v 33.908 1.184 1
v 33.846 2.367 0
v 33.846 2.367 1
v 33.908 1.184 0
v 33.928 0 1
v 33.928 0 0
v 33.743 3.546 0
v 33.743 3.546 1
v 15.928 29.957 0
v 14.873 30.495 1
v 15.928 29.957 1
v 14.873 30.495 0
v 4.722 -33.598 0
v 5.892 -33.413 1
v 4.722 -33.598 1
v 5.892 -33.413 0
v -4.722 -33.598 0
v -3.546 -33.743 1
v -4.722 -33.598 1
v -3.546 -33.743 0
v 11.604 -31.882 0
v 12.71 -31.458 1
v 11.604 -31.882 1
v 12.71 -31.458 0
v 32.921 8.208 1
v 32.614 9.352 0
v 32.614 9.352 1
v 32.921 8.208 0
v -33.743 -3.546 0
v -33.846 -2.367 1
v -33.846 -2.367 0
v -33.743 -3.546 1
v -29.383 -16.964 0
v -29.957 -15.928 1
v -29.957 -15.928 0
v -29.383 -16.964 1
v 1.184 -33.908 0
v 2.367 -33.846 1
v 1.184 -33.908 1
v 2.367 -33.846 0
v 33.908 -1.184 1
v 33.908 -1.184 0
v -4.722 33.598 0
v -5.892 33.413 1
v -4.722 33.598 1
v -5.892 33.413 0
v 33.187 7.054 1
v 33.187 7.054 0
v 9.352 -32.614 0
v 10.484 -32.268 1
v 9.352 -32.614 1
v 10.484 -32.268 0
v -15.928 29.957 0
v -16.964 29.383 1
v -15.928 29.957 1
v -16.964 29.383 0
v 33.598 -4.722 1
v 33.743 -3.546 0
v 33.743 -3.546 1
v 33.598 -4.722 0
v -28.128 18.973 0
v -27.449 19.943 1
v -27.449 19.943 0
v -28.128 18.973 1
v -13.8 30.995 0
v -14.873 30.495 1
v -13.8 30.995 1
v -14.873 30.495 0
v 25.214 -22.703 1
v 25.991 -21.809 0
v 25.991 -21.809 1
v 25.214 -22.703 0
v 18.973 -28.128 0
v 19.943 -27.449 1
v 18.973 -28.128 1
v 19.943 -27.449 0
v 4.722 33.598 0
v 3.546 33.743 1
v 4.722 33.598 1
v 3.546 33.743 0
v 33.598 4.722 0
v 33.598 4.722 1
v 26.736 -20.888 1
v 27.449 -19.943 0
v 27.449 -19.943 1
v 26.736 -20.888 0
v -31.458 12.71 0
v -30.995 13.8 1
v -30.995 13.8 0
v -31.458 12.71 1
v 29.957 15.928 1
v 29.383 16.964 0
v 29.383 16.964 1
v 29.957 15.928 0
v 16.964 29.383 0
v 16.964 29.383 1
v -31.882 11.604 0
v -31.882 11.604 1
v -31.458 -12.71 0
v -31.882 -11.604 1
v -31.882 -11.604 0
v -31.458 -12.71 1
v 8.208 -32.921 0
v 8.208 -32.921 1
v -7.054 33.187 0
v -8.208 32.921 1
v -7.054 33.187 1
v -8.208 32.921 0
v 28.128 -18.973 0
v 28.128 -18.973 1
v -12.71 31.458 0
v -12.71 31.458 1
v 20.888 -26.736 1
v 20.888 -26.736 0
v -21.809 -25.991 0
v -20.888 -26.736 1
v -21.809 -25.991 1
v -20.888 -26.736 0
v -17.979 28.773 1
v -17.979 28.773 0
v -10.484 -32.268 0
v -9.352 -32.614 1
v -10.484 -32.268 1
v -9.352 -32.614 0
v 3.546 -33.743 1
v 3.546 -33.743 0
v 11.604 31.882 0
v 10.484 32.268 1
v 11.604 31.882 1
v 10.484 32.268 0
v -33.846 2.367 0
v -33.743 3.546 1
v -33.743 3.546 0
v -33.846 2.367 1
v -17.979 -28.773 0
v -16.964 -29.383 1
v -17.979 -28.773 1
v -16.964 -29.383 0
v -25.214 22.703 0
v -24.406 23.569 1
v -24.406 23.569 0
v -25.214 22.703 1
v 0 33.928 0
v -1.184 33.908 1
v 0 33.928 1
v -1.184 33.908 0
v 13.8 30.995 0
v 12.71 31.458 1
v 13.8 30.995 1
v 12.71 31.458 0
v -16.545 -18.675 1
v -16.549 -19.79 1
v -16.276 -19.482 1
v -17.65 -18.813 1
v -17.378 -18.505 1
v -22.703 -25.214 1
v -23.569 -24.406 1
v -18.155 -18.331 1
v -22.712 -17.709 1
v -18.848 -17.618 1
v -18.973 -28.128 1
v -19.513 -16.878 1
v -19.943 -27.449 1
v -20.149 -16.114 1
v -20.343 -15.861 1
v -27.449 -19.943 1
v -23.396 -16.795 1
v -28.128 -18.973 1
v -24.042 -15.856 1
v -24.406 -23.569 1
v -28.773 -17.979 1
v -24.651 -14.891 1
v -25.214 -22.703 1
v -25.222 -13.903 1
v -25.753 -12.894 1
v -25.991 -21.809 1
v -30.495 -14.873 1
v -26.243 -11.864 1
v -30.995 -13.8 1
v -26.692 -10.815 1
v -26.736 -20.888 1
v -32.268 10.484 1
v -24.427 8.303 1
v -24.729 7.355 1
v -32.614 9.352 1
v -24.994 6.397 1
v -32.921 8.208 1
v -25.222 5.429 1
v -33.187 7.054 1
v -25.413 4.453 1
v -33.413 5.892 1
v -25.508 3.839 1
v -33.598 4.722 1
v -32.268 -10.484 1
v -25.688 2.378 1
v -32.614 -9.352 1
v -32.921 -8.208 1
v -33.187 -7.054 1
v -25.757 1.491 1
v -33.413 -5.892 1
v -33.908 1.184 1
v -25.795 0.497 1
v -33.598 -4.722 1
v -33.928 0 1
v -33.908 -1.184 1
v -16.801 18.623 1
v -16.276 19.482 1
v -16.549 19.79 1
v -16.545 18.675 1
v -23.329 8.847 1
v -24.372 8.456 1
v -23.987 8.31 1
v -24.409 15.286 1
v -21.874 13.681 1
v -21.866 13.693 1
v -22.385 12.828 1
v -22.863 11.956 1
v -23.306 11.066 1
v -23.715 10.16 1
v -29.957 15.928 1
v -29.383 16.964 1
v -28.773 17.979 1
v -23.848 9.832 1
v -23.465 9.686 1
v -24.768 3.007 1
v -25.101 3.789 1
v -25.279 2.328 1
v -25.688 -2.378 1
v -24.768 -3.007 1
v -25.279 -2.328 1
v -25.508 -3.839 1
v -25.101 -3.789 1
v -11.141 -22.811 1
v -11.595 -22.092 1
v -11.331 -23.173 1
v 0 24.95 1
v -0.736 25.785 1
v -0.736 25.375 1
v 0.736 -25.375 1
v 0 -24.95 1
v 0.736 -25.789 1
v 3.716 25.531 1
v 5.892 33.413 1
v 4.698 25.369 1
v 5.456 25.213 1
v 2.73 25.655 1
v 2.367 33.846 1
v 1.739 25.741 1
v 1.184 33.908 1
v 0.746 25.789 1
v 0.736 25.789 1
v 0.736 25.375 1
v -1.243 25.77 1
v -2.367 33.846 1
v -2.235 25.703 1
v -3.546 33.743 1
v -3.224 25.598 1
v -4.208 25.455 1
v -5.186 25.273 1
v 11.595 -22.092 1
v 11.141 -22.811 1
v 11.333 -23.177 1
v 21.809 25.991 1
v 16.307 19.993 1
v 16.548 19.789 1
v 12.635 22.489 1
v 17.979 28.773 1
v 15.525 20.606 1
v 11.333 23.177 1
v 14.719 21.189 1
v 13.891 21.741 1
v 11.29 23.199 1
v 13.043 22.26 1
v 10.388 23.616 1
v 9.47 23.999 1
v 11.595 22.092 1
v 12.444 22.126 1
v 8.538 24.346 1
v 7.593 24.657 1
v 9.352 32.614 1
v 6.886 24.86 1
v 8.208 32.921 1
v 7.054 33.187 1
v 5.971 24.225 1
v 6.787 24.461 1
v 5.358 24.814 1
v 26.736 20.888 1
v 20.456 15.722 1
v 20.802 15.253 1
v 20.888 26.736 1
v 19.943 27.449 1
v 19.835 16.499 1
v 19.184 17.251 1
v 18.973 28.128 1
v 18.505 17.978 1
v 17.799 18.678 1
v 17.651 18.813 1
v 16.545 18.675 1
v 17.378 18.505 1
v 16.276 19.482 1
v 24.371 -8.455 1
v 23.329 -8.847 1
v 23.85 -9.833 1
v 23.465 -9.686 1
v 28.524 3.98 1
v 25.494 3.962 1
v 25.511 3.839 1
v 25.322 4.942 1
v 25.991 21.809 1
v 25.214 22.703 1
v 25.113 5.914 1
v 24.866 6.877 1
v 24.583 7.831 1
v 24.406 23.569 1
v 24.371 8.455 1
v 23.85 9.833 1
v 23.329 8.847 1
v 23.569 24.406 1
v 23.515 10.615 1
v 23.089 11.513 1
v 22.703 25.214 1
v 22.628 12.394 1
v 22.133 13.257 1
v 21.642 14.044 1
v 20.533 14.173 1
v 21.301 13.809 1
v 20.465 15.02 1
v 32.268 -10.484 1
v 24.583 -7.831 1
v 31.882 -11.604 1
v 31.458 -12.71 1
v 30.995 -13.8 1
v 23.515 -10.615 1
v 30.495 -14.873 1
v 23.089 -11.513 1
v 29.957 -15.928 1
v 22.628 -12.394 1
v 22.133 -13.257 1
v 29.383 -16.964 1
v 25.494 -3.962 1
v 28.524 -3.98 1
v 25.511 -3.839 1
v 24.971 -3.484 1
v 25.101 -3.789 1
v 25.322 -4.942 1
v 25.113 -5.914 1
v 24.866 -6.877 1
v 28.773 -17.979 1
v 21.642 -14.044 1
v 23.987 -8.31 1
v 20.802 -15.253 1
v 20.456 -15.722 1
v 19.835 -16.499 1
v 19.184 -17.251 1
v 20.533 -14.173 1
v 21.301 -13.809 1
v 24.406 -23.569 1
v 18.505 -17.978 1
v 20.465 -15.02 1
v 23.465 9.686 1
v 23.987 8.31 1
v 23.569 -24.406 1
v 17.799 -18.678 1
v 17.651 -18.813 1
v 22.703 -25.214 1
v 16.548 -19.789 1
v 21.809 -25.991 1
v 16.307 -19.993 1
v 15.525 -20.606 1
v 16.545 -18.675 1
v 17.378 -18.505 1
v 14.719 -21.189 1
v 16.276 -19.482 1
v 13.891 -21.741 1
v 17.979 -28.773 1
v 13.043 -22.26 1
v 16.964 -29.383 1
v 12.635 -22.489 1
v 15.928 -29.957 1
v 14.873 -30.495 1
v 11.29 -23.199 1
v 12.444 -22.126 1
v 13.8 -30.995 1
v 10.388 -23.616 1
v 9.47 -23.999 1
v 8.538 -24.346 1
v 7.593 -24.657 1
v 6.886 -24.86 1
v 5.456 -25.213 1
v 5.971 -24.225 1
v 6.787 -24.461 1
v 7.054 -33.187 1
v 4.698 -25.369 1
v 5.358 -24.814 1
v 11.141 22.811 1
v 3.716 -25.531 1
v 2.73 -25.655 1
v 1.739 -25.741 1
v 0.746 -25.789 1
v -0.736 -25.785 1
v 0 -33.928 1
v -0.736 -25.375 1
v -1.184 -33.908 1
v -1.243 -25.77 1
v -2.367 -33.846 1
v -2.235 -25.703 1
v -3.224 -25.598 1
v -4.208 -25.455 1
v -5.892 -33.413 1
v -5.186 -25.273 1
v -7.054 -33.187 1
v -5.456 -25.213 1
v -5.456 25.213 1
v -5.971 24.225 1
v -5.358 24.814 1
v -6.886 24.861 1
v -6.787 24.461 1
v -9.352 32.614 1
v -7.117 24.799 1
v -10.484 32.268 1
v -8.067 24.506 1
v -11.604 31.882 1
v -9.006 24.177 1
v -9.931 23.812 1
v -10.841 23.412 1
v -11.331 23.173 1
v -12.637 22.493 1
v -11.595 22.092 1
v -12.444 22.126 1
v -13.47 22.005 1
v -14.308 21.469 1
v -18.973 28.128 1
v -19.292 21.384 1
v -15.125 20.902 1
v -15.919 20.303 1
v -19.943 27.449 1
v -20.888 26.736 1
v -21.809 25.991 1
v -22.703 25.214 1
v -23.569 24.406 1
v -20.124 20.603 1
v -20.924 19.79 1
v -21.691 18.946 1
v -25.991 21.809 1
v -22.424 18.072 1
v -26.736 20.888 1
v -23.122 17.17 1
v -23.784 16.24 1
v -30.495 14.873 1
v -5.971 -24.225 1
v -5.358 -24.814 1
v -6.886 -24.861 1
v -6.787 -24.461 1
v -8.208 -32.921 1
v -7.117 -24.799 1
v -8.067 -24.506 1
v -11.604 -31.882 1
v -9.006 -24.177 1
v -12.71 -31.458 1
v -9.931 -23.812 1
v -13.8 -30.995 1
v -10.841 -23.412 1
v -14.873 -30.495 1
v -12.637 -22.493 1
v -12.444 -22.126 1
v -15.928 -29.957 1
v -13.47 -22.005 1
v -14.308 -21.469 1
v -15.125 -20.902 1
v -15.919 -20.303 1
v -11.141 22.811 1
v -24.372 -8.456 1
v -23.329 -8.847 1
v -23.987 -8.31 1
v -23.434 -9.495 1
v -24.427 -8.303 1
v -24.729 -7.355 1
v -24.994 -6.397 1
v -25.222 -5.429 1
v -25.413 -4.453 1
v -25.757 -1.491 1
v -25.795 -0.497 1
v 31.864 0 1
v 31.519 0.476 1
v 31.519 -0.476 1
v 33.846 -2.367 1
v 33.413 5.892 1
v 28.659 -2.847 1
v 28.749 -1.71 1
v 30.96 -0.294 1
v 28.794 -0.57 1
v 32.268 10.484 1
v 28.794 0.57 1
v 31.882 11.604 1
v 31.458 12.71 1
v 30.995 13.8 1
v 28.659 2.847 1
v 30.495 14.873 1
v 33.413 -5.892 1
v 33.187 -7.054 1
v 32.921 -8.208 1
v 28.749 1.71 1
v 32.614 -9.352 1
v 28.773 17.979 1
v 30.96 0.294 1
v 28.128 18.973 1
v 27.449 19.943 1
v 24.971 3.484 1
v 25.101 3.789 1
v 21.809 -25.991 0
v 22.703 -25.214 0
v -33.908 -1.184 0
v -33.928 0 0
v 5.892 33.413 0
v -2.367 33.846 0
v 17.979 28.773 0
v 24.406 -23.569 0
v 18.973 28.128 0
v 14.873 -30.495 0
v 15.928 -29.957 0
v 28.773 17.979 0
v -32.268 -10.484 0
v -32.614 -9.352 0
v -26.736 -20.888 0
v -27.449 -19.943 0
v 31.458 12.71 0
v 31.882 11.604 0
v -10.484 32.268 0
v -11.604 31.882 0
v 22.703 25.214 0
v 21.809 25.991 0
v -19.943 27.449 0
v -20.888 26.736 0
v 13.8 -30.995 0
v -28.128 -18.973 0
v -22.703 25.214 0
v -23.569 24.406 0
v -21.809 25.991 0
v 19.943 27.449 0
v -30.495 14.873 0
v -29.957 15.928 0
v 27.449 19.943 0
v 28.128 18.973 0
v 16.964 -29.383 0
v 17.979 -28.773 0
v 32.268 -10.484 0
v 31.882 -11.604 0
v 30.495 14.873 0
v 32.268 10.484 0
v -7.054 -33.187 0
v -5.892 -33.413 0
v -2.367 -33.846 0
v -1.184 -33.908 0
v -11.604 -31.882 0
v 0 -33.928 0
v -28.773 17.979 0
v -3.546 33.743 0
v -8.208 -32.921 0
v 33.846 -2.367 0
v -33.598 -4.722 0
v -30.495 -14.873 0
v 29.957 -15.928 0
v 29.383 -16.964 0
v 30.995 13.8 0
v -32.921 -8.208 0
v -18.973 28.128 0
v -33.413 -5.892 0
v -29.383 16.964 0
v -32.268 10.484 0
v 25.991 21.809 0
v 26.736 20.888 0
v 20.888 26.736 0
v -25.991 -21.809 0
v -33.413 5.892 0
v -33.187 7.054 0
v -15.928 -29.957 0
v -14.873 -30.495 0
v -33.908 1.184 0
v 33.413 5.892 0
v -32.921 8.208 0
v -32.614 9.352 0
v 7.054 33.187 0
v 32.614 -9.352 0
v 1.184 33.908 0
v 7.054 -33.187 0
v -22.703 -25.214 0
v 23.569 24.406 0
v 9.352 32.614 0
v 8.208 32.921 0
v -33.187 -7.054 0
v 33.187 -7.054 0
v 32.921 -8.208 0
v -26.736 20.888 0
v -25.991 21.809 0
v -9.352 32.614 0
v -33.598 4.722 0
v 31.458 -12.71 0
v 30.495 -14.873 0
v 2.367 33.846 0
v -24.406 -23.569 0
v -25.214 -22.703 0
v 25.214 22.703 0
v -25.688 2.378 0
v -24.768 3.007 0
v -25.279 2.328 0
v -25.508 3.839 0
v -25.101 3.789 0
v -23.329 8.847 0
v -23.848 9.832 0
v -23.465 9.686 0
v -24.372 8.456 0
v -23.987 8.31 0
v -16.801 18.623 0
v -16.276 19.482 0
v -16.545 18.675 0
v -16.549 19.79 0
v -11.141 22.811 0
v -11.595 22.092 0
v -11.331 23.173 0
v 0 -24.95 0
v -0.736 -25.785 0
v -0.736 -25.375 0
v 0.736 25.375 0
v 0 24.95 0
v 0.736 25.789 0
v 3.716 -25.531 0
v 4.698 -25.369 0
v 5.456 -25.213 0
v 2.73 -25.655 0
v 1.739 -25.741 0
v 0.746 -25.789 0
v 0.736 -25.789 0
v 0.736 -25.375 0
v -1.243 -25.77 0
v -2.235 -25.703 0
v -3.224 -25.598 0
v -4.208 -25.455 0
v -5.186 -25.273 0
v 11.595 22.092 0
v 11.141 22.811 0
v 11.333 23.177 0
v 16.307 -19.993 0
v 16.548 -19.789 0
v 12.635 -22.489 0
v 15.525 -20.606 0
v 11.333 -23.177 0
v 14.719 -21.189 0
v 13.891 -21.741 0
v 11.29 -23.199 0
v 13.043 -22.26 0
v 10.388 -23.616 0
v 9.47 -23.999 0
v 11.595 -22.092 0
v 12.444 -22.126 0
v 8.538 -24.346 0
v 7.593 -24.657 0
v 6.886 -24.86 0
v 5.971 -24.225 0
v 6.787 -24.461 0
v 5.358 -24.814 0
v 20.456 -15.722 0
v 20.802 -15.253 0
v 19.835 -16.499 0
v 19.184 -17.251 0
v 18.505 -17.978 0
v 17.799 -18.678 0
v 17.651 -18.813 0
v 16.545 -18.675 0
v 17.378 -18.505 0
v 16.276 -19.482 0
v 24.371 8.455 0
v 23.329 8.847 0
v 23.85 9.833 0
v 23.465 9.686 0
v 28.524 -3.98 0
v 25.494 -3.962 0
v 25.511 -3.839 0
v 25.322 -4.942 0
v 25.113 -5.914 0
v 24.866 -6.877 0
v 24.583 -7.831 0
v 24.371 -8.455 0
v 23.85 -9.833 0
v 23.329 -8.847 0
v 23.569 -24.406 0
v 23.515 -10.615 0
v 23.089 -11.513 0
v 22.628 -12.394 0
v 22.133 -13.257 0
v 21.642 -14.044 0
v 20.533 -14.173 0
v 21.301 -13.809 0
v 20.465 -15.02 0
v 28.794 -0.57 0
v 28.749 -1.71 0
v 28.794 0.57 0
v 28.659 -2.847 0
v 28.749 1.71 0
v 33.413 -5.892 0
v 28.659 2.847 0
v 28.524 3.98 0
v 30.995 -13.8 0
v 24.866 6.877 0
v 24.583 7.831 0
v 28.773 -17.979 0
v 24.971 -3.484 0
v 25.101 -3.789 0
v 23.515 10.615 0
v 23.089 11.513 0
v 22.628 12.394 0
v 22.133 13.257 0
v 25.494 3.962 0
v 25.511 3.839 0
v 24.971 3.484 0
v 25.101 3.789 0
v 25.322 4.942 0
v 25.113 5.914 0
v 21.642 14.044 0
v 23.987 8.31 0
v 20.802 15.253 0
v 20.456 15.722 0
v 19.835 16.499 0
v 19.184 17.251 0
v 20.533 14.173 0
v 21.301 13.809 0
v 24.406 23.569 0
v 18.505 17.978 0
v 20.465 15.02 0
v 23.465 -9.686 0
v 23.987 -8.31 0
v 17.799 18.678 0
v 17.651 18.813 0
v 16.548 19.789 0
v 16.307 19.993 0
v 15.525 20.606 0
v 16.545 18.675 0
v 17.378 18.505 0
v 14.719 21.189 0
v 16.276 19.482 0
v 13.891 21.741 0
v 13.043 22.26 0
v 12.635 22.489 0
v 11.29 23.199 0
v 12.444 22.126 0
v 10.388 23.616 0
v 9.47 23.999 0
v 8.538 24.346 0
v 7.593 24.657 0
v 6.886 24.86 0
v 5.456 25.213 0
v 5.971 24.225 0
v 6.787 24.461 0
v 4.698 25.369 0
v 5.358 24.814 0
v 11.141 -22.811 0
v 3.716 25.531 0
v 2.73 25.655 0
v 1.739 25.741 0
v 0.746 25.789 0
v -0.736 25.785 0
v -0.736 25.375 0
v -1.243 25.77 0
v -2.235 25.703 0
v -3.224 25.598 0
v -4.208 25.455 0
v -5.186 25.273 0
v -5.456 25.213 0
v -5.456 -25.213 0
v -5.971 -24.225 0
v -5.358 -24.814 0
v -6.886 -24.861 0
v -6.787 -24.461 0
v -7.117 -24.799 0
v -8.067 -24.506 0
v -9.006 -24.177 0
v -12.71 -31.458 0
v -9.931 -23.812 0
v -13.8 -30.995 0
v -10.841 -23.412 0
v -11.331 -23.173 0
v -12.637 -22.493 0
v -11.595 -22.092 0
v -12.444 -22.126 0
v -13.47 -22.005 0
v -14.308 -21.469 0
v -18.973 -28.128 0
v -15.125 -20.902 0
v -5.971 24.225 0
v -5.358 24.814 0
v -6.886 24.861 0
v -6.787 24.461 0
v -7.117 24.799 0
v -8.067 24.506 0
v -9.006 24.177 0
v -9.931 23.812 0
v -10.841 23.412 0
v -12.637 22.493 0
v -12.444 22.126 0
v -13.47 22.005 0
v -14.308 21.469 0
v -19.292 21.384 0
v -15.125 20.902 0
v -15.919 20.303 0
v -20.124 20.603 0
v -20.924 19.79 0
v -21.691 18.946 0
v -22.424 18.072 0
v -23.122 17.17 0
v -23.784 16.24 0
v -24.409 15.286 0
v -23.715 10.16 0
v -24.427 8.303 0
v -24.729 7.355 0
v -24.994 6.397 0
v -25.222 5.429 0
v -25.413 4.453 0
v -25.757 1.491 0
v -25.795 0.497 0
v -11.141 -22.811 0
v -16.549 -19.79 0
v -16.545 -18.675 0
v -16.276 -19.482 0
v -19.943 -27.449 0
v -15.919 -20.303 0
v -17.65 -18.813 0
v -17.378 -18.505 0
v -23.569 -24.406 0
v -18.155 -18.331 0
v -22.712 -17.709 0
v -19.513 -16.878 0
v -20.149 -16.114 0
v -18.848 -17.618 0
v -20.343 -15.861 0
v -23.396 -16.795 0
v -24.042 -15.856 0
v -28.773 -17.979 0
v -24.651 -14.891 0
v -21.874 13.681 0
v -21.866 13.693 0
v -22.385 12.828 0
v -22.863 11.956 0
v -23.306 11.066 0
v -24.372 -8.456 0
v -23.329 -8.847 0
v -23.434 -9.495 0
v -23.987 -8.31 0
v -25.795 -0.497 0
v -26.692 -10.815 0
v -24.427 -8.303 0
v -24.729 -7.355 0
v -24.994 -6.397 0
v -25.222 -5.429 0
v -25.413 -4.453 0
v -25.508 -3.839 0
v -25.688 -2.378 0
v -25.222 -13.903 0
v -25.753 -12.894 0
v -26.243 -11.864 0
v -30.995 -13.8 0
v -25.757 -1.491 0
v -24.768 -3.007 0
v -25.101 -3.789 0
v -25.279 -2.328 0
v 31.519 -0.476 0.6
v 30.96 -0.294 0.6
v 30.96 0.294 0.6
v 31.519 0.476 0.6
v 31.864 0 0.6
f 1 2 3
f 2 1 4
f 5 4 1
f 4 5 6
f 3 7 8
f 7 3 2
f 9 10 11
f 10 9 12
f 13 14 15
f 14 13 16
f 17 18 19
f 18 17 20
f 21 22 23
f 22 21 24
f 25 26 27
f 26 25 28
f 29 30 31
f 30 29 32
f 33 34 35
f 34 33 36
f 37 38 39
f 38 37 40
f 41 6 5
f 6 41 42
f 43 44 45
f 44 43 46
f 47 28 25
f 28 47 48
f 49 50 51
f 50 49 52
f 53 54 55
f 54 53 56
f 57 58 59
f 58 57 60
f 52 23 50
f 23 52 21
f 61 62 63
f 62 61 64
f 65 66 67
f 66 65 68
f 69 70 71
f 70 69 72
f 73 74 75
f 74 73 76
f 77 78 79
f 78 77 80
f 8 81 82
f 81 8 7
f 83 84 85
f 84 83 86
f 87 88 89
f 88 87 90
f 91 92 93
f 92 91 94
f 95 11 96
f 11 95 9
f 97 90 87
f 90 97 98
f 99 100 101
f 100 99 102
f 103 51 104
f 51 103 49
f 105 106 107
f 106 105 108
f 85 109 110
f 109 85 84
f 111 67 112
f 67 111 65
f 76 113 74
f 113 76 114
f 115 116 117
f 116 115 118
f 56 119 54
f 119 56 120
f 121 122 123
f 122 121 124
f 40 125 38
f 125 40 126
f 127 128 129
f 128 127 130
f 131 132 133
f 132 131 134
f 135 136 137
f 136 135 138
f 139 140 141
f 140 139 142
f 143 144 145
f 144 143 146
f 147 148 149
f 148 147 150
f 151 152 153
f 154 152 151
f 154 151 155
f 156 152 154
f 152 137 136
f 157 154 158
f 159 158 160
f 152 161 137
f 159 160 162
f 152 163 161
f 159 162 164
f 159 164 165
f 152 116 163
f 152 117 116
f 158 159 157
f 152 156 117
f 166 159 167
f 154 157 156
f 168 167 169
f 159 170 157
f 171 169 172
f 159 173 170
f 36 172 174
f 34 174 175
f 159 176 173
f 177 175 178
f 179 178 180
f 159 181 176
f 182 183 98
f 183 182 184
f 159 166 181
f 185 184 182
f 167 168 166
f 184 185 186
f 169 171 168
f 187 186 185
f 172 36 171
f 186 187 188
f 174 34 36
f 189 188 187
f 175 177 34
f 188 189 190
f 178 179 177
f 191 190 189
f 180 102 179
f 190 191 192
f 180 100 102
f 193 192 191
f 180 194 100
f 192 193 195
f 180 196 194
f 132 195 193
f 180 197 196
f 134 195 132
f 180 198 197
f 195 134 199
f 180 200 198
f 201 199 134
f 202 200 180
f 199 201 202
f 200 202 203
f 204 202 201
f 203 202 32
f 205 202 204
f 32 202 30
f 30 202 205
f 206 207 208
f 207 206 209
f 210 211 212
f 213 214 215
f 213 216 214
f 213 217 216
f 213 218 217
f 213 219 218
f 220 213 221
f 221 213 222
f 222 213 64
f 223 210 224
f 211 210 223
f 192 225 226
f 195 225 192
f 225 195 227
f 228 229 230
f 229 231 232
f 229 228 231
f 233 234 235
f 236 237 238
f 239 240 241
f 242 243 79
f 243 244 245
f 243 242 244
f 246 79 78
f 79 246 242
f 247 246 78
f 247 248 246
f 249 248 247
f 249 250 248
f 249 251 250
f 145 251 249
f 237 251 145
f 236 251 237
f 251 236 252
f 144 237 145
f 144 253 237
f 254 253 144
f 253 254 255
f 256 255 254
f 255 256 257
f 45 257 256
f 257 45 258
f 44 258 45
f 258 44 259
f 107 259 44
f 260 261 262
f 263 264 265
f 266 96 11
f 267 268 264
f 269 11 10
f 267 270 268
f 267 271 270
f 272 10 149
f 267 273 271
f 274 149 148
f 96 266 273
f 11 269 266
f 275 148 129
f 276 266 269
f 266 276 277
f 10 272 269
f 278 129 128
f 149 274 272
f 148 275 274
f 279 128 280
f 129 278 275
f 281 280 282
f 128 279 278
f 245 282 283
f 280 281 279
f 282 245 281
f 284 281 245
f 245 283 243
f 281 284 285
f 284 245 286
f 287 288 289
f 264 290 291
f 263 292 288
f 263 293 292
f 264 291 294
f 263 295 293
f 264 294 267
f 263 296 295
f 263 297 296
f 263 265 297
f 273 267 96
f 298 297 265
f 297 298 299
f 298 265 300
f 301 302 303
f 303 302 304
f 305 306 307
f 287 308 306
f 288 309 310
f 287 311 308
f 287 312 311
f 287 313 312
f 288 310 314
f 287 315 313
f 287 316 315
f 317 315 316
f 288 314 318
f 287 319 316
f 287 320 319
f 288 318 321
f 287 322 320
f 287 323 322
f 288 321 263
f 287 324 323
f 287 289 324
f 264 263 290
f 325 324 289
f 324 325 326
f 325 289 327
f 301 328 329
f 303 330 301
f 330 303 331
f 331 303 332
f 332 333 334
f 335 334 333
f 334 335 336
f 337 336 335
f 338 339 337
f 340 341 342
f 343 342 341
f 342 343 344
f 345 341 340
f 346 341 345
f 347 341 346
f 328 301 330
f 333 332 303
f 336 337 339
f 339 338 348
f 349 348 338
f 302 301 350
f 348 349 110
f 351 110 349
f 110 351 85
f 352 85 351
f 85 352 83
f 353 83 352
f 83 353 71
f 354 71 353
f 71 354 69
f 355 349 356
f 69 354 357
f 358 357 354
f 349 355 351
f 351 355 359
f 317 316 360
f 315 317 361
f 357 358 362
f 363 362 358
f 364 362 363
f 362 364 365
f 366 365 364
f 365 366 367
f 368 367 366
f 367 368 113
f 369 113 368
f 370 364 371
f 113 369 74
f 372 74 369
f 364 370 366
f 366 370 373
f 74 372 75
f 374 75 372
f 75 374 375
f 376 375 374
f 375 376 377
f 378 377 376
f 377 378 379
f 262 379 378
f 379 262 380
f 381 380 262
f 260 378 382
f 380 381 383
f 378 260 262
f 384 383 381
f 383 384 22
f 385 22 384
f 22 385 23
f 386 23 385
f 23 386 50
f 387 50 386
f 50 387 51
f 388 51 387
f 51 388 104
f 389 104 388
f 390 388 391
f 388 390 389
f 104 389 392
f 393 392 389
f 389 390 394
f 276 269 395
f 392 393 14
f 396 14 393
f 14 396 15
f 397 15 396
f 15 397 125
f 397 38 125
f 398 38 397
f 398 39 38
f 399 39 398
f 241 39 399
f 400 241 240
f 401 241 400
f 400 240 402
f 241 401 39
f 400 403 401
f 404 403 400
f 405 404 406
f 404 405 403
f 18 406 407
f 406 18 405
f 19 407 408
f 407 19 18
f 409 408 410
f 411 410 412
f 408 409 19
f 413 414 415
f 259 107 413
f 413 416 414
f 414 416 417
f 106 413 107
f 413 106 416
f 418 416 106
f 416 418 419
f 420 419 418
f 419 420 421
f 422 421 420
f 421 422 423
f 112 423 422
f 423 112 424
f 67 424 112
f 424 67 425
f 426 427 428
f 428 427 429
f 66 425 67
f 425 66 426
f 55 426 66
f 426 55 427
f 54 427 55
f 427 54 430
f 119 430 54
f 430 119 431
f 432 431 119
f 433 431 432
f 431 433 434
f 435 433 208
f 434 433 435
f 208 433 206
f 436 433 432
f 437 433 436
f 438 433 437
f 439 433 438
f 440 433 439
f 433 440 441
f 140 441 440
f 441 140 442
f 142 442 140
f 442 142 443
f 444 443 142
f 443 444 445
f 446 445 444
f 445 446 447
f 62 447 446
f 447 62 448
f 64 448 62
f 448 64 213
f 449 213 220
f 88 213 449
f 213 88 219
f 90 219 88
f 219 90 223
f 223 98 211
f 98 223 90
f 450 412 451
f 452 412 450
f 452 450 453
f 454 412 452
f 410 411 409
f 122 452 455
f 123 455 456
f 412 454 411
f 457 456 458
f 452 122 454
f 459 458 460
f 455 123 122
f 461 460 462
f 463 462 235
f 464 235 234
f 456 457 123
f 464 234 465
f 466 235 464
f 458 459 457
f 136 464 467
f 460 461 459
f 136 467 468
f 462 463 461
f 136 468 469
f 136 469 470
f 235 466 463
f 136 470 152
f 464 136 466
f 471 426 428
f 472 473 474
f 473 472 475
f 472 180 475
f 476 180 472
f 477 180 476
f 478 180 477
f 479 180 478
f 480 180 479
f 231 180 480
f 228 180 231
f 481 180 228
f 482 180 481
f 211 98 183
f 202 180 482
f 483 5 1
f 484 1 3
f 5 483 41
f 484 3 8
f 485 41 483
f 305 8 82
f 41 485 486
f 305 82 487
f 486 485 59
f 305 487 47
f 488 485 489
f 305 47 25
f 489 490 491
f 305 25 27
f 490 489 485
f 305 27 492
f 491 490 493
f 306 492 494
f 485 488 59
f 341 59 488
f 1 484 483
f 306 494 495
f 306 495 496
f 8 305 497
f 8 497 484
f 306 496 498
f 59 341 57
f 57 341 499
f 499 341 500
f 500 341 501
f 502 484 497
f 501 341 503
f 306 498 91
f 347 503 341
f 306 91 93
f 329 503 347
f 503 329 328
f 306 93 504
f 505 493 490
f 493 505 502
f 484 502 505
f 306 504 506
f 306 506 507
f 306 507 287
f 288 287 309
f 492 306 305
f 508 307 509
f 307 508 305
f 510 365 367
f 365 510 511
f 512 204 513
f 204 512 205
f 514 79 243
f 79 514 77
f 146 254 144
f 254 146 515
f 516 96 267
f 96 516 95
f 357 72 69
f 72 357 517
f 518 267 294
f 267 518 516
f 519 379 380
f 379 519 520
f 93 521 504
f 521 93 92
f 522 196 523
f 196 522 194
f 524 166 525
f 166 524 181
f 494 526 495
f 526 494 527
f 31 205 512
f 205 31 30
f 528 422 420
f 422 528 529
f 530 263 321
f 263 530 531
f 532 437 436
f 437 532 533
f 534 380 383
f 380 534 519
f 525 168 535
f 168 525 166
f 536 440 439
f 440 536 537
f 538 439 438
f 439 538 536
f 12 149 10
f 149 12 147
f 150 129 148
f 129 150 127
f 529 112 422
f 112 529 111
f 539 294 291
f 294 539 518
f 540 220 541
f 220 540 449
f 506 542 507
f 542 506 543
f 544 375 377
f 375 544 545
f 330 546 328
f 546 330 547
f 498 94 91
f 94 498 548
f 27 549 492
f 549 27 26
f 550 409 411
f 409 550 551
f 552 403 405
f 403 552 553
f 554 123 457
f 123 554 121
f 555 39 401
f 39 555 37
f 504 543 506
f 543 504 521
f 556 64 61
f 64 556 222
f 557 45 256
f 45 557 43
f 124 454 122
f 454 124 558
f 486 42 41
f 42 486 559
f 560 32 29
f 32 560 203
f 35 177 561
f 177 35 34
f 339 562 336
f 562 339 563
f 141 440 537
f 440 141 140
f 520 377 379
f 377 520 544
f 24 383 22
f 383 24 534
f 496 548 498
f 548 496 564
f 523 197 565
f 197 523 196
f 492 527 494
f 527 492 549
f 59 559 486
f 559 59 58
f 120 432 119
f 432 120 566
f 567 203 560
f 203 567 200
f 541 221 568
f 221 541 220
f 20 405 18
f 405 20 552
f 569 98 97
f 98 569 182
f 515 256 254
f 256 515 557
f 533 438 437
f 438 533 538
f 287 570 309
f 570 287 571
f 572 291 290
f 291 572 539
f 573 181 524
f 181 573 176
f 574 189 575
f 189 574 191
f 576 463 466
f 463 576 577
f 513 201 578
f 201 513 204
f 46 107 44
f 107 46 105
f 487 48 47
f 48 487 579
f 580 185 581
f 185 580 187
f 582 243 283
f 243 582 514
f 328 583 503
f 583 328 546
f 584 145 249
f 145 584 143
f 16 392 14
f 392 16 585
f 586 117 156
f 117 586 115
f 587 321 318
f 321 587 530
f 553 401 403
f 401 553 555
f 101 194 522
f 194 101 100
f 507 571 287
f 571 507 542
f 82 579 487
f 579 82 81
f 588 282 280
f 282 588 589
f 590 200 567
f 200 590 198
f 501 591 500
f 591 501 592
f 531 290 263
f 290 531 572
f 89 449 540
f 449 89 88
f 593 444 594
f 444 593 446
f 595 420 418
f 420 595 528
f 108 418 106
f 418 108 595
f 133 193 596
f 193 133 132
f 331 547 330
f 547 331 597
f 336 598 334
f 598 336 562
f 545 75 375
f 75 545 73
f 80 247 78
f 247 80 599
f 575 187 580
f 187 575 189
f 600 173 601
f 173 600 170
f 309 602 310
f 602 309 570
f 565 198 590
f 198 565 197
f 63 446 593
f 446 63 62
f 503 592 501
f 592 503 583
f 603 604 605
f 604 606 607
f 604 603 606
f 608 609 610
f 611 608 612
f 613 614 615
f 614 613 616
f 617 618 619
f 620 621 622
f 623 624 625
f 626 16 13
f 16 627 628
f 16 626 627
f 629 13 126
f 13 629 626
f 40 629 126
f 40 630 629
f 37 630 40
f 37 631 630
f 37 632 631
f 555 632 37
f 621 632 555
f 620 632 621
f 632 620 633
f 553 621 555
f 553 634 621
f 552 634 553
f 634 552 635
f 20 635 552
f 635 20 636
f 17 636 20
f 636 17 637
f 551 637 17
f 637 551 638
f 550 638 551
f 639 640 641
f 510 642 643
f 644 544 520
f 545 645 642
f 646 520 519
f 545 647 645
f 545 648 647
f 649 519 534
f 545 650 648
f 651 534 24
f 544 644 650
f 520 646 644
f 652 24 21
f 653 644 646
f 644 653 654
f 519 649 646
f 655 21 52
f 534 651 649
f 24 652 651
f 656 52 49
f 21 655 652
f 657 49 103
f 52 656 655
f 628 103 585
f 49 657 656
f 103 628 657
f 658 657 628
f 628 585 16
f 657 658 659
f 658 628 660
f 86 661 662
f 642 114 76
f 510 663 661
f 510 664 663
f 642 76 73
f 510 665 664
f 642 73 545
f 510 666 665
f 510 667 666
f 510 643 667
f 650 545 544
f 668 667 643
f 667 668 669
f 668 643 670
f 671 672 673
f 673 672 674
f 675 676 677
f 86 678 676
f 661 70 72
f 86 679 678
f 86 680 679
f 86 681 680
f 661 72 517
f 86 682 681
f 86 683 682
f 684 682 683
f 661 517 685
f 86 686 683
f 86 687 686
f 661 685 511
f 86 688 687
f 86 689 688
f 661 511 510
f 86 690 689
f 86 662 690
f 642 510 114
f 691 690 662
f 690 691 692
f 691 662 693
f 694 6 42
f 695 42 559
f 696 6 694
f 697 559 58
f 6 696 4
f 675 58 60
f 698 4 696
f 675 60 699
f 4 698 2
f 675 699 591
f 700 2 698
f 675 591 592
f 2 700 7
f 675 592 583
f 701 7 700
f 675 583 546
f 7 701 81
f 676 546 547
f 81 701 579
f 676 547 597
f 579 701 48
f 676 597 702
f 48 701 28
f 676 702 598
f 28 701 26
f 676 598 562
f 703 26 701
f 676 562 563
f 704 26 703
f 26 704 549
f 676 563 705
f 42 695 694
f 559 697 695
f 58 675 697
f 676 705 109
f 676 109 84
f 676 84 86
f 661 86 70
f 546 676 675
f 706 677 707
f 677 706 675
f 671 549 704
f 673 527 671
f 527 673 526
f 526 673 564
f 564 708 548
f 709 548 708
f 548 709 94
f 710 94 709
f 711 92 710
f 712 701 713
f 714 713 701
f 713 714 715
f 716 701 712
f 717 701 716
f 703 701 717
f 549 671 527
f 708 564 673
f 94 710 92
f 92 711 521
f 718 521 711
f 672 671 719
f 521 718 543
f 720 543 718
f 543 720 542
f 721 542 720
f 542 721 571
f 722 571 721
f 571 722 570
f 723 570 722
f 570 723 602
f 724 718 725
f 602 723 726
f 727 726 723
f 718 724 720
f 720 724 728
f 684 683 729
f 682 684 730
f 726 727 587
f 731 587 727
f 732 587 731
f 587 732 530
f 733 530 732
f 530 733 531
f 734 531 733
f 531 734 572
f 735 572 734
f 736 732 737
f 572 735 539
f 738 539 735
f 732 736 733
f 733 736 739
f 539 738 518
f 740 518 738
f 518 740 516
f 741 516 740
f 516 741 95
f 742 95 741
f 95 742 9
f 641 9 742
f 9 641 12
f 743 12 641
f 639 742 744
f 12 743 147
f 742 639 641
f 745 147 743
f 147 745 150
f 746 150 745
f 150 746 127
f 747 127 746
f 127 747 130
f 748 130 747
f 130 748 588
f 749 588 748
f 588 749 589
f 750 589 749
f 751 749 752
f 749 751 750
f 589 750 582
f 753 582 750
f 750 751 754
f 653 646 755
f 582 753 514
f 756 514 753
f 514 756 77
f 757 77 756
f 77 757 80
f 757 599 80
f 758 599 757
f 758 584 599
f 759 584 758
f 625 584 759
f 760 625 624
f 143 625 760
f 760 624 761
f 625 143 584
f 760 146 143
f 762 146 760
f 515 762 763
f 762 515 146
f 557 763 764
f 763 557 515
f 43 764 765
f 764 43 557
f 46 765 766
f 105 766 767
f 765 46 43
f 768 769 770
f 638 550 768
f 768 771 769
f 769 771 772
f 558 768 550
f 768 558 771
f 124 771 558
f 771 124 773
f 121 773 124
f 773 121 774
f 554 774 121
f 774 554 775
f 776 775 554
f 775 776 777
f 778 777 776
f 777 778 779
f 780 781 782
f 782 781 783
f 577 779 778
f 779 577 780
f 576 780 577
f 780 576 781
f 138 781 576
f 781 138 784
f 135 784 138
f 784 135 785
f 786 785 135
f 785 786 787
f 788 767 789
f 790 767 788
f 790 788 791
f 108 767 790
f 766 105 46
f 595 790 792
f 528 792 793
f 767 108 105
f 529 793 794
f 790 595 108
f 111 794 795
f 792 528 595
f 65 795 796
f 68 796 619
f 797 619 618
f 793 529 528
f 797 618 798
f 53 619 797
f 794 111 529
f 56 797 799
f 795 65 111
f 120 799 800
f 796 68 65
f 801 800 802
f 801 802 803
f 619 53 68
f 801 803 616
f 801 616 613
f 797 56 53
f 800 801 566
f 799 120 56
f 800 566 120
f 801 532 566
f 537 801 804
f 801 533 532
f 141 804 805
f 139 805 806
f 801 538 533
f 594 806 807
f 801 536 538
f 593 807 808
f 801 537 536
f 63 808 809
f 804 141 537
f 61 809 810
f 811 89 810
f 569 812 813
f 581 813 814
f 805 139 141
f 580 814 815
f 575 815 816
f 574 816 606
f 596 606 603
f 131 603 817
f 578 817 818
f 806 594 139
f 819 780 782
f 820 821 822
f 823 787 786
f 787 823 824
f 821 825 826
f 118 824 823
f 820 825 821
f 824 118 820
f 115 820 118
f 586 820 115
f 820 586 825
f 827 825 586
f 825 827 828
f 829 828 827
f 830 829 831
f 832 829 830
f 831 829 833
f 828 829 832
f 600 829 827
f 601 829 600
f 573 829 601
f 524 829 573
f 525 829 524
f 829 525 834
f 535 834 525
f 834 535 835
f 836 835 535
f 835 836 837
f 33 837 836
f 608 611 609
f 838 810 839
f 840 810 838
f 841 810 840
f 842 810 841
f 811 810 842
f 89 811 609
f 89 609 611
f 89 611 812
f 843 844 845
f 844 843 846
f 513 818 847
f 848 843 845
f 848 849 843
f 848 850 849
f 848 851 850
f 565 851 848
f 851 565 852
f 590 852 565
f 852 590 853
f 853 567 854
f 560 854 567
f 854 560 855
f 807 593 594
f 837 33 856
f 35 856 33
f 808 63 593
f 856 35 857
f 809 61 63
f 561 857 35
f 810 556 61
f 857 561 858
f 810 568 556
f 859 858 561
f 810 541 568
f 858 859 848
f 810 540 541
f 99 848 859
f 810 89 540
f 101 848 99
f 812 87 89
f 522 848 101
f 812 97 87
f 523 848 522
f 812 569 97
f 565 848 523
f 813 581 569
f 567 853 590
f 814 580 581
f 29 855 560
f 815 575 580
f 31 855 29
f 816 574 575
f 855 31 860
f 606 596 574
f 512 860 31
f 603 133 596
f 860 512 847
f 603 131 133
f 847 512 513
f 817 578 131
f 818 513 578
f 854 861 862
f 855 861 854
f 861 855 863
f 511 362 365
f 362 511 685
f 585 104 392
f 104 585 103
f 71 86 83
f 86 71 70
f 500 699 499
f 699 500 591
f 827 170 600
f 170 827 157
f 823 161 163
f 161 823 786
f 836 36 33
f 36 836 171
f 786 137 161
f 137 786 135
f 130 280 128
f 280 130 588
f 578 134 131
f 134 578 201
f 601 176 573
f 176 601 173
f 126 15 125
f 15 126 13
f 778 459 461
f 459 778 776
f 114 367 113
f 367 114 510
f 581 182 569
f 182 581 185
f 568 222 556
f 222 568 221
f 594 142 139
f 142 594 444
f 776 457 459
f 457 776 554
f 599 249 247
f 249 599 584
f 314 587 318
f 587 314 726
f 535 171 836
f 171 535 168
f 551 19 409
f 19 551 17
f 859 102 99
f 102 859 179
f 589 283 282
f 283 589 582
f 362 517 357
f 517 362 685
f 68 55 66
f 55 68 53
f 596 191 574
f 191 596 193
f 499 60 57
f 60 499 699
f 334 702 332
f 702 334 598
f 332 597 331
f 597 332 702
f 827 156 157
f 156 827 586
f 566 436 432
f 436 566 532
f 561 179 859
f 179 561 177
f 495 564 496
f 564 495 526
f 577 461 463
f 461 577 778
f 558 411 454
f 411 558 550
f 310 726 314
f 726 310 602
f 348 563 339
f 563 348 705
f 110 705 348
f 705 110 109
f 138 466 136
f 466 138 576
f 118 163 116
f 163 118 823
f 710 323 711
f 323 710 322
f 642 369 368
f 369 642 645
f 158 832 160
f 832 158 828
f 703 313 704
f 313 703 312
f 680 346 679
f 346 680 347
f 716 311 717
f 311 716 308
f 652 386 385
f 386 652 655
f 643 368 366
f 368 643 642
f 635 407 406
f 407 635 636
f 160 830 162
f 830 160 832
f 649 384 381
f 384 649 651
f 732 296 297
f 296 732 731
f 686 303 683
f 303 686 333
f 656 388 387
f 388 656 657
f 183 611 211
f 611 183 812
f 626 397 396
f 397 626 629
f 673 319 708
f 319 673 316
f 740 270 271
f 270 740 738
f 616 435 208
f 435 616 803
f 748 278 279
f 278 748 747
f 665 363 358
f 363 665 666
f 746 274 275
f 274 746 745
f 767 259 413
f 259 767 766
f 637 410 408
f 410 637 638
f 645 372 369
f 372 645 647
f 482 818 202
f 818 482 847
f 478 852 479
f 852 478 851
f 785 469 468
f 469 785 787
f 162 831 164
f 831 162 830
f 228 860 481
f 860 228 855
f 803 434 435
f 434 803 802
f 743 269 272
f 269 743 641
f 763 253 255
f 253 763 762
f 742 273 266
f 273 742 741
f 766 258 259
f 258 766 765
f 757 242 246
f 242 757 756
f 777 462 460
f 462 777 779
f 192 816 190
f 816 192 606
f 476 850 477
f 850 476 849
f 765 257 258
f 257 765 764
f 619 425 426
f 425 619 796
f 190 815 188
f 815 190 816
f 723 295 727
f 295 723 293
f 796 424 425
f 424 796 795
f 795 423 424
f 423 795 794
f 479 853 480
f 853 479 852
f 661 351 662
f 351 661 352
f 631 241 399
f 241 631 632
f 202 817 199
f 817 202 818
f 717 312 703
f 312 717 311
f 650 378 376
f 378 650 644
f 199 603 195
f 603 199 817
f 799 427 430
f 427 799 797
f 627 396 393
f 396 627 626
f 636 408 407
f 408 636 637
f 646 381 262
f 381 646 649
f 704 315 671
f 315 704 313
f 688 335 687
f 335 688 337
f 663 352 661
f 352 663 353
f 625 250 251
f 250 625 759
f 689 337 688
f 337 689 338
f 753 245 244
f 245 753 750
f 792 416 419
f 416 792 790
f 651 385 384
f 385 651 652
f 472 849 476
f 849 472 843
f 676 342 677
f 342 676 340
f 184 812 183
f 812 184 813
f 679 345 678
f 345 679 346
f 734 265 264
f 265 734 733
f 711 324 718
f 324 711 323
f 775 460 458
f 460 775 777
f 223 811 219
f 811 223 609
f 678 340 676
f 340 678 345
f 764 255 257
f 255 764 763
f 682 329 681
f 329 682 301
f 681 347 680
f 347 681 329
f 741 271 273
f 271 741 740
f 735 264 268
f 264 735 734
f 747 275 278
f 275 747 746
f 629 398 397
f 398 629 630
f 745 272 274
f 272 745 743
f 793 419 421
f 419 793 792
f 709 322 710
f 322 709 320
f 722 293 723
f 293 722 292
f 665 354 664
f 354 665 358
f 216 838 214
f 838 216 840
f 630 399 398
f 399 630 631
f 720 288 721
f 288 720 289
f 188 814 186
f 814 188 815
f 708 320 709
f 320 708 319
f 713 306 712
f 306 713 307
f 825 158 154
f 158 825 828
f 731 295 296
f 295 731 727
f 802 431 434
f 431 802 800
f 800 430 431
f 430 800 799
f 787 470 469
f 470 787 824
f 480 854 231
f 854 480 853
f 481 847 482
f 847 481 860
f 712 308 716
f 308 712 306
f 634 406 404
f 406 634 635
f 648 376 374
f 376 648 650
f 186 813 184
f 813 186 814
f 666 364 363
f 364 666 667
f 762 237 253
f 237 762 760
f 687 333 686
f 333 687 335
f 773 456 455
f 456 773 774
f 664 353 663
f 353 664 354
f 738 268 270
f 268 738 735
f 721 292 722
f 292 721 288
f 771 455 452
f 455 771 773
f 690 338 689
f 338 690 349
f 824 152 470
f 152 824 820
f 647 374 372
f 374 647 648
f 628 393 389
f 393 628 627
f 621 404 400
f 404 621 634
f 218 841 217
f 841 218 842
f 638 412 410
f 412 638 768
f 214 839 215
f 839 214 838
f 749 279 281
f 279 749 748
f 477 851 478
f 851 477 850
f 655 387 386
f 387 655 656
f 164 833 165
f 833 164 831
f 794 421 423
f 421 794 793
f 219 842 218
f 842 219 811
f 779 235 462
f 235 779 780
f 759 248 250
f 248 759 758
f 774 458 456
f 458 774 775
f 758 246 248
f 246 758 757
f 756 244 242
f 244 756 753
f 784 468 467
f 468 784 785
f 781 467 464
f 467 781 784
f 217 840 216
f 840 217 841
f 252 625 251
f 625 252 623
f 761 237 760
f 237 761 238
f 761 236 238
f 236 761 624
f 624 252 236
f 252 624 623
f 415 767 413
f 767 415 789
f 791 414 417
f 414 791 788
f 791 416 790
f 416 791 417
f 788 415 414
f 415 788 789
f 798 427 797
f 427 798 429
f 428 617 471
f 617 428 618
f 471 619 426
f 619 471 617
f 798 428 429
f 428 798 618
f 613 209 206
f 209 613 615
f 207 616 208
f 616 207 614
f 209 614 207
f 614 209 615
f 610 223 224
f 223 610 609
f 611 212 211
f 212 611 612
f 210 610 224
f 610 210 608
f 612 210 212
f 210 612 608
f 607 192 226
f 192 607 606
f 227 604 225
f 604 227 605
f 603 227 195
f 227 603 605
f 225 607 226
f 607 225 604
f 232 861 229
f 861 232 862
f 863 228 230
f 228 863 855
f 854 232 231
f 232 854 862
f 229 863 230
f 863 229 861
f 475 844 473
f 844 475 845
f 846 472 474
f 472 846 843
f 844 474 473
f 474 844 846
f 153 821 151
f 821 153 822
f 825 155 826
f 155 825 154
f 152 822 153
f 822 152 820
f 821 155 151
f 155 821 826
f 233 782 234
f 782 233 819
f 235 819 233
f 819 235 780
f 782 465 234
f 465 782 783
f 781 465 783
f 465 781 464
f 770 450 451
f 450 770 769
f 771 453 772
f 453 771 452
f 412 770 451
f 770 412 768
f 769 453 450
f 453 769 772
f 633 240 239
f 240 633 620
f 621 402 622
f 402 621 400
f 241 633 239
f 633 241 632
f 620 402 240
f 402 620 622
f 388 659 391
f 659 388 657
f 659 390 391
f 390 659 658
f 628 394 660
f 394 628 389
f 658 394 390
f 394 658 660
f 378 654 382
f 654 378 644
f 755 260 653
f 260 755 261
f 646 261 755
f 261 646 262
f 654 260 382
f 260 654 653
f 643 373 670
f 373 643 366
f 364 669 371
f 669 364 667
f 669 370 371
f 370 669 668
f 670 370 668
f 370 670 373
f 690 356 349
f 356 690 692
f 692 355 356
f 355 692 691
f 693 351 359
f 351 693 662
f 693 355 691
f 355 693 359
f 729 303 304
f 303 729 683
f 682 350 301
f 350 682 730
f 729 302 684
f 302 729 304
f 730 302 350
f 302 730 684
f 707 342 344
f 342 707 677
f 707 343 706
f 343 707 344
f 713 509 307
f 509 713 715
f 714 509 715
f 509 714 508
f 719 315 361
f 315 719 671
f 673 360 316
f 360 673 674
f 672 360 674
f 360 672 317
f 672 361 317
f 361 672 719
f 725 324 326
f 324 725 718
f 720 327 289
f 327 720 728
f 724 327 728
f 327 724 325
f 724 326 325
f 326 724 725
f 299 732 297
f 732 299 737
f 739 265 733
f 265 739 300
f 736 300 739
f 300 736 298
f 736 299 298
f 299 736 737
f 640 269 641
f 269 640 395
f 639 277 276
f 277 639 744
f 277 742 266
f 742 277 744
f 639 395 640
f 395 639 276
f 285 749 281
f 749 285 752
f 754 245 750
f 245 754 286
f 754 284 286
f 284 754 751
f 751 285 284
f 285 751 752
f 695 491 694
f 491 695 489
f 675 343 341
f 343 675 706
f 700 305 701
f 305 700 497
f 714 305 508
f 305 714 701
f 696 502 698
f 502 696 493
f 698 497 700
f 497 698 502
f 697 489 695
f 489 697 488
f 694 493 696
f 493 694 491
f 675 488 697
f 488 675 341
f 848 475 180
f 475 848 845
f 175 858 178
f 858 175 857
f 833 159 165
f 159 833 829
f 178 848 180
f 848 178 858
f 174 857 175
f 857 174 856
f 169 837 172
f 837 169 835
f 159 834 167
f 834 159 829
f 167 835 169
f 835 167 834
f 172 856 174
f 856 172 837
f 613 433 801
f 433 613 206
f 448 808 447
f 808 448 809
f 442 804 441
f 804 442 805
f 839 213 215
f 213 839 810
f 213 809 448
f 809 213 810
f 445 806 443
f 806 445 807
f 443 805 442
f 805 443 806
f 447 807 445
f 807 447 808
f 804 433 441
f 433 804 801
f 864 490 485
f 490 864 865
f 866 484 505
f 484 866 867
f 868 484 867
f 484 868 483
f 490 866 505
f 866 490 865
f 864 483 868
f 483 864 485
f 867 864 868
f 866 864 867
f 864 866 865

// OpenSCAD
// file: mainparams.scad
/* [Main Parameters] */

// Diameter of inner compartment
compartmentDiameter = 40;

// Height of inner compartment
compartmentHeight = 70;

// Number of rotating rings
numRings = 5;

// Labels on rings, also determines number of positions
positionLabelsStr = "ABCDEFGHIJKLMNOPQRSTUVWXYZ";

// Customizer part
part = "innershell"; // [innershell:Inner Shell, outershell:Outer Shell, ring:Ring, lockring:Lock Ring, endcap:End Cap]

/* [Hidden] */

positionLabels = [ for (i = [0 : len(positionLabelsStr) - 1]) positionLabelsStr[i] ];
// file: common.scad
// Polygon is centered on origin, with "first" point along X axis
module RegularPolygon(numCorners, outerRadius, faceOnXAxis=false) {
    points = [
        for (pointNum = [0 : numCorners - 1])
            [cos(pointNum / numCorners * 360) * outerRadius, sin(pointNum / numCorners * 360) * outerRadius]
    ];
    if (faceOnXAxis)
        rotate([0, 0, 360/numCorners/2])
            polygon(points);
    else
        polygon(points);
};

// Returns multipler to get inner radius (closest distance to origin) from a regular polygon with outer radius of 1
function regularPolygonInnerRadiusMultiplier(numCorners) =
    let (pt = ([1, 0] + [cos(1 / numCorners * 360), sin(1 / numCorners * 360)]) / 2)
        sqrt(pt[0]*pt[0] + pt[1]*pt[1]);

// width is gap width of slot (Y axis)
module LockRingFinger(width, innerRadius, outerRadius, height, spanAngle) {
    rotate([0, 0, spanAngle/2])
        linear_extrude(height=height, twist=spanAngle, slices=height*10)
            translate([innerRadius, -width/2])
                square([outerRadius - innerRadius, width]);
};

// Mark on the shell bases pointing to the "solution" line
module ShellBaseLineMark(radius, height, numPositions, lineWidth=0.4, depth=0.5) {
    // chevron projected around cylinder
    
    spanAngle = 360/numPositions*0.75;
    translate([0, 0, height])
        mirror([0, 0, 1])
            union() {
                // first line
                linear_extrude(height, twist=spanAngle, slices=height/0.2)
                    translate([radius-depth, -lineWidth/2])
                        square([depth, lineWidth]);
                // second line
                linear_extrude(height, twist=-spanAngle, slices=height/0.2)
                    translate([radius-depth, -lineWidth/2])
                        square([depth, lineWidth]);
            };
};


//ShellBaseLineMark(radius=20, height=7, numPositions=26);
// file: rotate_extrude.scad
// From http://forum.openscad.org/rotate-extrude-angle-always-360-td19035.html

module rotate_extrude2(angle=360, convexity=2, size=1000) {

  module angle_cut(angle=90,size=1000) {
    x = size*cos(angle/2);
    y = size*sin(angle/2);
    translate([0,0,-size]) 
      linear_extrude(2*size) polygon([[0,0],[x,y],[x,size],[-size,size],[-size,-size],[x,-size],[x,-y]]);
  }

  // support for angle parameter in rotate_extrude was added after release 2015.03 
  // Thingiverse customizer is still on 2015.03
  angleSupport = (version_num() > 20150399) ? true : false; // Next openscad releases after 2015.03.xx will have support angle parameter
  // Using angle parameter when possible provides huge speed boost, avoids a difference operation

  if (angleSupport || angle == 360) {
    rotate_extrude(angle=angle,convexity=convexity)
      children();
  } else {
    rotate([0,0,angle/2]) difference() {
      rotate_extrude(convexity=convexity) children();
      angle_cut(angle, size);
    }
  }
}
// file: sharedparams.scad
use <common.scad>

/*
// Main parameters
compartmentDiameter = 40;
compartmentHeight = 30;
numRings = 2;
positionLabels = [
    "A", "B", "C", "D", "E", "F", "G", "H", "I", "J",
    "K", "L", "M", "N", "O", "P", "Q", "R", "S", "T",
    "U", "V", "W", "X", "Y", "Z"
];
//positionLabels = [ "1", "2", "3", "4", "5", "6", "7", "8", "9", "0" ];
*/
include <mainparams.scad>

numPositions = len(positionLabels);

ringRotateClearance = 0.2; // used for a couple of different clearances relating to Z spacing of rings rotating next to each other

// Lock ring
lockRingHeightClearance = ringRotateClearance;
lockRingHeight = max(compartmentDiameter/10, 3 + lockRingHeightClearance);
//lockRingHeightClearance = max(0.1 * numRings, 0.35); // clearance for rings to rotate against each other, in addition to ring height clearance
lockRingActualHeight = lockRingHeight - lockRingHeightClearance;
lockRingFingerAngles = [60, 180, 300];
lockRingFingerWidth = compartmentDiameter * 0.075;
lockRingSlotWidthClearance = 0.6;
//lockRingDetentOsProtrusion = 0.3; // amount lock ring detents protrude into the outer shell

// Inner shell
isInnerRadius = compartmentDiameter / 2;
isThick = max(compartmentDiameter/20, 2);
isOuterRadius = isInnerRadius + isThick;
isInnerHeight = compartmentHeight;
isBaseThick = 3;
isOuterHeight = isInnerHeight + isBaseThick;
isProngSpanAngle = 10; // angular width of the lock prongs
isProngOffsetZ = -(numRings * ringRotateClearance + 0.2); // vertical clearance between each ring and the prongs below it in locked position

// Outer shell
isOsClearance = 0.3; // Clearance on radius
osInnerRadius = isOuterRadius + isOsClearance;
osThick = max(compartmentDiameter/20, min(compartmentHeight/15, 3.2), 2);
osOuterRadius = osInnerRadius + osThick;
osInnerHeight = isInnerHeight;
osBaseThick = isBaseThick + lockRingHeight;
osOuterHeight = osInnerHeight + osBaseThick;
osSlotClearance = 0.3; // Clearance on each side of the fins to the outer shell slots
osSlotSpanAngle = isProngSpanAngle + 360 * osSlotClearance / (2 * PI * osInnerRadius) * 2;

lockRingSpanAngle = lockRingHeight / (2 * PI * osOuterRadius) * 360;

// Rings
ringSpacing = (isInnerHeight - lockRingHeight) / numRings;
osRingClearance = 0.3;
osProngProtrusion = compartmentDiameter * 0.0675 + osRingClearance; // Amount lock prongs protrude from the OD of the outer shell
isProngProtrusion = isOsClearance + osThick + osProngProtrusion; // amount the lock prongs extend from the OD of the inner shell cylinder
prongHeight = osProngProtrusion + 1; // total height of lock prongs, at the OD of the outer shell
ringInnerRadius = osOuterRadius + osRingClearance;
ringProngEndClearance = 0.3; // Clearance between the end of the prongs and the ring
ringProngCoverThick = min(max(compartmentDiameter / 20, 1), 3);
ringMinThick = osProngProtrusion + ringProngCoverThick + ringProngEndClearance;
ringOuterMinRadius = ringInnerRadius + ringMinThick;
ringOuterRadius = ringOuterMinRadius / regularPolygonInnerRadiusMultiplier(numPositions);
ringHeightClearance = ringRotateClearance;
ringHeight = ringSpacing - ringHeightClearance;
ringSlotClearance = 0.5;
ringSlotSpanAngle = isProngSpanAngle + 360 * ringSlotClearance / (2 * PI * ringInnerRadius) * 2;
prongCoverHeightClearance = 0.6; // amount shells will open before prongs engage on rings
lockSlotOuterRadius = osOuterRadius + osProngProtrusion + ringProngEndClearance; // outer radius of slots for lock prongs
falseLockSlotDepth = 0.3; // depth of false lock slots to make cracking more difficult
prongCoverHeight = prongHeight - isProngOffsetZ + prongCoverHeightClearance;

// Detents
detentDepth = 0.85;  // radius of detent cylindrical depressions
detentArm1Angle = 90; // Angle of the part of the arm that actually contacts the detent
detentArm2Angle = (numPositions % 2 == 0) ? detentArm1Angle + 180 : detentArm1Angle + 180 - (360 / numPositions / 2); 
detentArmThick = 1.5;
detentArmLength = min(15, ringInnerRadius * 1.3);
detentArmHeightMin = 1;
detentArmHeightMax = ringHeight - prongCoverHeight - detentArmThick - detentDepth - 0.5;
detentArmHeightIdeal = ringOuterRadius * 0.1; // depends on radius, so as torque increases, resistance linearly increases
detentArmHeight = max(detentArmHeightMin, min(detentArmHeightMax, detentArmHeightIdeal));

// Label rings
labelRingRingClearanceMax = 0.3; // clearance tapers to allow for easier press fit
labelRingRingClearanceMin = 0.2;
labelRingMinThick = max(compartmentDiameter / 20, 1);
labelRingHeight = ringHeight;
labelRingInnerHeight = labelRingHeight * 0.8; // thickness/height tapers to prevent label rings from slipping vertically
labelRingInnerMinRadius = ringOuterMinRadius + labelRingRingClearanceMin;
labelRingInnerRadius = labelRingInnerMinRadius / regularPolygonInnerRadiusMultiplier(numPositions);
labelRingInnerBufferMinRadius = max(labelRingInnerMinRadius, ringOuterRadius + osRingClearance + labelRingRingClearanceMax); // inner radius on the top and bottom of label ring to prevent engaging adjacent rings if they slide
labelRingInnerBufferRadius = labelRingInnerBufferMinRadius / regularPolygonInnerRadiusMultiplier(numPositions);
labelRingInnerBufferHeight = labelRingHeight / 6;
labelRingContactHeight = labelRingHeight / 3; // amount of label ring in contact with ring (tapering from clearanceMax to clearanceMin)
labelRingOuterMinRadius = max(labelRingInnerMinRadius, labelRingInnerBufferMinRadius) + labelRingMinThick;
labelRingOuterRadius = labelRingOuterMinRadius / regularPolygonInnerRadiusMultiplier(numPositions);
labelRingKeySphereRadius = labelRingRingClearanceMax + 0.1;
labelDepth = 0.5;

// Spacer ring
// This part is entirely optional and usually not needed.  If there's extra slack for the
// rings on the outer shell, it can be measured and a spacer ring can be printed
// to take up the slack.
spacerRingHeight = 1.0;

osBaseRadius = labelRingOuterMinRadius;
//lockRingDetentRadius = lockRingDetentOsProtrusion + osRingClearance;
lockRingDetentRadius = detentDepth;

lockRingPinAngles = lockRingFingerAngles;
lockRingPinRadius = (osBaseRadius - ringInnerRadius) / 4;
lockRingPinX = (osBaseRadius + ringInnerRadius) / 2;
lockRingPinClearance = 0.3;
lockRingPinHeight = lockRingActualHeight * 0.9;

topMarkerDotRadius = 0.5;
topMarkerDotDepth = 0.4;

// Misc
latchAngles = [ 0, 180+30, 180-40 ];
falseLockSlotAngles = [ for (a = latchAngles) a + 360/numPositions*floor(numPositions/2) ];

// System
$fa = 2;
$fs = 1;
// main file
include <sharedparams.scad>
use <rotate_extrude.scad>
use <common.scad>

module SpacerRing() {
    difference() {
        union() {
            // Hollow cylinder
            difference() {
                cylinder(r=osBaseRadius, h=spacerRingHeight);
                cylinder(r=ringInnerRadius, h=spacerRingHeight);
            };
            
            // Inner detent cylinders
            for (ang = [detentArm1Angle : 360 / numPositions : detentArm1Angle + 360])
                rotate([0, 0, ang])
                    translate([ringInnerRadius, 0, 0])
                        cylinder(r=lockRingDetentRadius, h=spacerRingHeight);
        };
        
        // Slots for lock prongs
        // Add slightly more clearance because these don't actually need to block the fins
        slotSpanAngle = ringSlotSpanAngle * 1.3;
        for (ang = latchAngles)
            rotate([0, 0, -slotSpanAngle/2 + ang])
                rotate_extrude2(angle=slotSpanAngle)
                    square([lockSlotOuterRadius, 1000]);

        // Top marker dot
        translate([(osBaseRadius+lockSlotOuterRadius)/2, 0, spacerRingHeight-topMarkerDotDepth])
            cylinder(r=topMarkerDotRadius, h=topMarkerDotDepth);
    };
};

SpacerRing();  // no-customizer
